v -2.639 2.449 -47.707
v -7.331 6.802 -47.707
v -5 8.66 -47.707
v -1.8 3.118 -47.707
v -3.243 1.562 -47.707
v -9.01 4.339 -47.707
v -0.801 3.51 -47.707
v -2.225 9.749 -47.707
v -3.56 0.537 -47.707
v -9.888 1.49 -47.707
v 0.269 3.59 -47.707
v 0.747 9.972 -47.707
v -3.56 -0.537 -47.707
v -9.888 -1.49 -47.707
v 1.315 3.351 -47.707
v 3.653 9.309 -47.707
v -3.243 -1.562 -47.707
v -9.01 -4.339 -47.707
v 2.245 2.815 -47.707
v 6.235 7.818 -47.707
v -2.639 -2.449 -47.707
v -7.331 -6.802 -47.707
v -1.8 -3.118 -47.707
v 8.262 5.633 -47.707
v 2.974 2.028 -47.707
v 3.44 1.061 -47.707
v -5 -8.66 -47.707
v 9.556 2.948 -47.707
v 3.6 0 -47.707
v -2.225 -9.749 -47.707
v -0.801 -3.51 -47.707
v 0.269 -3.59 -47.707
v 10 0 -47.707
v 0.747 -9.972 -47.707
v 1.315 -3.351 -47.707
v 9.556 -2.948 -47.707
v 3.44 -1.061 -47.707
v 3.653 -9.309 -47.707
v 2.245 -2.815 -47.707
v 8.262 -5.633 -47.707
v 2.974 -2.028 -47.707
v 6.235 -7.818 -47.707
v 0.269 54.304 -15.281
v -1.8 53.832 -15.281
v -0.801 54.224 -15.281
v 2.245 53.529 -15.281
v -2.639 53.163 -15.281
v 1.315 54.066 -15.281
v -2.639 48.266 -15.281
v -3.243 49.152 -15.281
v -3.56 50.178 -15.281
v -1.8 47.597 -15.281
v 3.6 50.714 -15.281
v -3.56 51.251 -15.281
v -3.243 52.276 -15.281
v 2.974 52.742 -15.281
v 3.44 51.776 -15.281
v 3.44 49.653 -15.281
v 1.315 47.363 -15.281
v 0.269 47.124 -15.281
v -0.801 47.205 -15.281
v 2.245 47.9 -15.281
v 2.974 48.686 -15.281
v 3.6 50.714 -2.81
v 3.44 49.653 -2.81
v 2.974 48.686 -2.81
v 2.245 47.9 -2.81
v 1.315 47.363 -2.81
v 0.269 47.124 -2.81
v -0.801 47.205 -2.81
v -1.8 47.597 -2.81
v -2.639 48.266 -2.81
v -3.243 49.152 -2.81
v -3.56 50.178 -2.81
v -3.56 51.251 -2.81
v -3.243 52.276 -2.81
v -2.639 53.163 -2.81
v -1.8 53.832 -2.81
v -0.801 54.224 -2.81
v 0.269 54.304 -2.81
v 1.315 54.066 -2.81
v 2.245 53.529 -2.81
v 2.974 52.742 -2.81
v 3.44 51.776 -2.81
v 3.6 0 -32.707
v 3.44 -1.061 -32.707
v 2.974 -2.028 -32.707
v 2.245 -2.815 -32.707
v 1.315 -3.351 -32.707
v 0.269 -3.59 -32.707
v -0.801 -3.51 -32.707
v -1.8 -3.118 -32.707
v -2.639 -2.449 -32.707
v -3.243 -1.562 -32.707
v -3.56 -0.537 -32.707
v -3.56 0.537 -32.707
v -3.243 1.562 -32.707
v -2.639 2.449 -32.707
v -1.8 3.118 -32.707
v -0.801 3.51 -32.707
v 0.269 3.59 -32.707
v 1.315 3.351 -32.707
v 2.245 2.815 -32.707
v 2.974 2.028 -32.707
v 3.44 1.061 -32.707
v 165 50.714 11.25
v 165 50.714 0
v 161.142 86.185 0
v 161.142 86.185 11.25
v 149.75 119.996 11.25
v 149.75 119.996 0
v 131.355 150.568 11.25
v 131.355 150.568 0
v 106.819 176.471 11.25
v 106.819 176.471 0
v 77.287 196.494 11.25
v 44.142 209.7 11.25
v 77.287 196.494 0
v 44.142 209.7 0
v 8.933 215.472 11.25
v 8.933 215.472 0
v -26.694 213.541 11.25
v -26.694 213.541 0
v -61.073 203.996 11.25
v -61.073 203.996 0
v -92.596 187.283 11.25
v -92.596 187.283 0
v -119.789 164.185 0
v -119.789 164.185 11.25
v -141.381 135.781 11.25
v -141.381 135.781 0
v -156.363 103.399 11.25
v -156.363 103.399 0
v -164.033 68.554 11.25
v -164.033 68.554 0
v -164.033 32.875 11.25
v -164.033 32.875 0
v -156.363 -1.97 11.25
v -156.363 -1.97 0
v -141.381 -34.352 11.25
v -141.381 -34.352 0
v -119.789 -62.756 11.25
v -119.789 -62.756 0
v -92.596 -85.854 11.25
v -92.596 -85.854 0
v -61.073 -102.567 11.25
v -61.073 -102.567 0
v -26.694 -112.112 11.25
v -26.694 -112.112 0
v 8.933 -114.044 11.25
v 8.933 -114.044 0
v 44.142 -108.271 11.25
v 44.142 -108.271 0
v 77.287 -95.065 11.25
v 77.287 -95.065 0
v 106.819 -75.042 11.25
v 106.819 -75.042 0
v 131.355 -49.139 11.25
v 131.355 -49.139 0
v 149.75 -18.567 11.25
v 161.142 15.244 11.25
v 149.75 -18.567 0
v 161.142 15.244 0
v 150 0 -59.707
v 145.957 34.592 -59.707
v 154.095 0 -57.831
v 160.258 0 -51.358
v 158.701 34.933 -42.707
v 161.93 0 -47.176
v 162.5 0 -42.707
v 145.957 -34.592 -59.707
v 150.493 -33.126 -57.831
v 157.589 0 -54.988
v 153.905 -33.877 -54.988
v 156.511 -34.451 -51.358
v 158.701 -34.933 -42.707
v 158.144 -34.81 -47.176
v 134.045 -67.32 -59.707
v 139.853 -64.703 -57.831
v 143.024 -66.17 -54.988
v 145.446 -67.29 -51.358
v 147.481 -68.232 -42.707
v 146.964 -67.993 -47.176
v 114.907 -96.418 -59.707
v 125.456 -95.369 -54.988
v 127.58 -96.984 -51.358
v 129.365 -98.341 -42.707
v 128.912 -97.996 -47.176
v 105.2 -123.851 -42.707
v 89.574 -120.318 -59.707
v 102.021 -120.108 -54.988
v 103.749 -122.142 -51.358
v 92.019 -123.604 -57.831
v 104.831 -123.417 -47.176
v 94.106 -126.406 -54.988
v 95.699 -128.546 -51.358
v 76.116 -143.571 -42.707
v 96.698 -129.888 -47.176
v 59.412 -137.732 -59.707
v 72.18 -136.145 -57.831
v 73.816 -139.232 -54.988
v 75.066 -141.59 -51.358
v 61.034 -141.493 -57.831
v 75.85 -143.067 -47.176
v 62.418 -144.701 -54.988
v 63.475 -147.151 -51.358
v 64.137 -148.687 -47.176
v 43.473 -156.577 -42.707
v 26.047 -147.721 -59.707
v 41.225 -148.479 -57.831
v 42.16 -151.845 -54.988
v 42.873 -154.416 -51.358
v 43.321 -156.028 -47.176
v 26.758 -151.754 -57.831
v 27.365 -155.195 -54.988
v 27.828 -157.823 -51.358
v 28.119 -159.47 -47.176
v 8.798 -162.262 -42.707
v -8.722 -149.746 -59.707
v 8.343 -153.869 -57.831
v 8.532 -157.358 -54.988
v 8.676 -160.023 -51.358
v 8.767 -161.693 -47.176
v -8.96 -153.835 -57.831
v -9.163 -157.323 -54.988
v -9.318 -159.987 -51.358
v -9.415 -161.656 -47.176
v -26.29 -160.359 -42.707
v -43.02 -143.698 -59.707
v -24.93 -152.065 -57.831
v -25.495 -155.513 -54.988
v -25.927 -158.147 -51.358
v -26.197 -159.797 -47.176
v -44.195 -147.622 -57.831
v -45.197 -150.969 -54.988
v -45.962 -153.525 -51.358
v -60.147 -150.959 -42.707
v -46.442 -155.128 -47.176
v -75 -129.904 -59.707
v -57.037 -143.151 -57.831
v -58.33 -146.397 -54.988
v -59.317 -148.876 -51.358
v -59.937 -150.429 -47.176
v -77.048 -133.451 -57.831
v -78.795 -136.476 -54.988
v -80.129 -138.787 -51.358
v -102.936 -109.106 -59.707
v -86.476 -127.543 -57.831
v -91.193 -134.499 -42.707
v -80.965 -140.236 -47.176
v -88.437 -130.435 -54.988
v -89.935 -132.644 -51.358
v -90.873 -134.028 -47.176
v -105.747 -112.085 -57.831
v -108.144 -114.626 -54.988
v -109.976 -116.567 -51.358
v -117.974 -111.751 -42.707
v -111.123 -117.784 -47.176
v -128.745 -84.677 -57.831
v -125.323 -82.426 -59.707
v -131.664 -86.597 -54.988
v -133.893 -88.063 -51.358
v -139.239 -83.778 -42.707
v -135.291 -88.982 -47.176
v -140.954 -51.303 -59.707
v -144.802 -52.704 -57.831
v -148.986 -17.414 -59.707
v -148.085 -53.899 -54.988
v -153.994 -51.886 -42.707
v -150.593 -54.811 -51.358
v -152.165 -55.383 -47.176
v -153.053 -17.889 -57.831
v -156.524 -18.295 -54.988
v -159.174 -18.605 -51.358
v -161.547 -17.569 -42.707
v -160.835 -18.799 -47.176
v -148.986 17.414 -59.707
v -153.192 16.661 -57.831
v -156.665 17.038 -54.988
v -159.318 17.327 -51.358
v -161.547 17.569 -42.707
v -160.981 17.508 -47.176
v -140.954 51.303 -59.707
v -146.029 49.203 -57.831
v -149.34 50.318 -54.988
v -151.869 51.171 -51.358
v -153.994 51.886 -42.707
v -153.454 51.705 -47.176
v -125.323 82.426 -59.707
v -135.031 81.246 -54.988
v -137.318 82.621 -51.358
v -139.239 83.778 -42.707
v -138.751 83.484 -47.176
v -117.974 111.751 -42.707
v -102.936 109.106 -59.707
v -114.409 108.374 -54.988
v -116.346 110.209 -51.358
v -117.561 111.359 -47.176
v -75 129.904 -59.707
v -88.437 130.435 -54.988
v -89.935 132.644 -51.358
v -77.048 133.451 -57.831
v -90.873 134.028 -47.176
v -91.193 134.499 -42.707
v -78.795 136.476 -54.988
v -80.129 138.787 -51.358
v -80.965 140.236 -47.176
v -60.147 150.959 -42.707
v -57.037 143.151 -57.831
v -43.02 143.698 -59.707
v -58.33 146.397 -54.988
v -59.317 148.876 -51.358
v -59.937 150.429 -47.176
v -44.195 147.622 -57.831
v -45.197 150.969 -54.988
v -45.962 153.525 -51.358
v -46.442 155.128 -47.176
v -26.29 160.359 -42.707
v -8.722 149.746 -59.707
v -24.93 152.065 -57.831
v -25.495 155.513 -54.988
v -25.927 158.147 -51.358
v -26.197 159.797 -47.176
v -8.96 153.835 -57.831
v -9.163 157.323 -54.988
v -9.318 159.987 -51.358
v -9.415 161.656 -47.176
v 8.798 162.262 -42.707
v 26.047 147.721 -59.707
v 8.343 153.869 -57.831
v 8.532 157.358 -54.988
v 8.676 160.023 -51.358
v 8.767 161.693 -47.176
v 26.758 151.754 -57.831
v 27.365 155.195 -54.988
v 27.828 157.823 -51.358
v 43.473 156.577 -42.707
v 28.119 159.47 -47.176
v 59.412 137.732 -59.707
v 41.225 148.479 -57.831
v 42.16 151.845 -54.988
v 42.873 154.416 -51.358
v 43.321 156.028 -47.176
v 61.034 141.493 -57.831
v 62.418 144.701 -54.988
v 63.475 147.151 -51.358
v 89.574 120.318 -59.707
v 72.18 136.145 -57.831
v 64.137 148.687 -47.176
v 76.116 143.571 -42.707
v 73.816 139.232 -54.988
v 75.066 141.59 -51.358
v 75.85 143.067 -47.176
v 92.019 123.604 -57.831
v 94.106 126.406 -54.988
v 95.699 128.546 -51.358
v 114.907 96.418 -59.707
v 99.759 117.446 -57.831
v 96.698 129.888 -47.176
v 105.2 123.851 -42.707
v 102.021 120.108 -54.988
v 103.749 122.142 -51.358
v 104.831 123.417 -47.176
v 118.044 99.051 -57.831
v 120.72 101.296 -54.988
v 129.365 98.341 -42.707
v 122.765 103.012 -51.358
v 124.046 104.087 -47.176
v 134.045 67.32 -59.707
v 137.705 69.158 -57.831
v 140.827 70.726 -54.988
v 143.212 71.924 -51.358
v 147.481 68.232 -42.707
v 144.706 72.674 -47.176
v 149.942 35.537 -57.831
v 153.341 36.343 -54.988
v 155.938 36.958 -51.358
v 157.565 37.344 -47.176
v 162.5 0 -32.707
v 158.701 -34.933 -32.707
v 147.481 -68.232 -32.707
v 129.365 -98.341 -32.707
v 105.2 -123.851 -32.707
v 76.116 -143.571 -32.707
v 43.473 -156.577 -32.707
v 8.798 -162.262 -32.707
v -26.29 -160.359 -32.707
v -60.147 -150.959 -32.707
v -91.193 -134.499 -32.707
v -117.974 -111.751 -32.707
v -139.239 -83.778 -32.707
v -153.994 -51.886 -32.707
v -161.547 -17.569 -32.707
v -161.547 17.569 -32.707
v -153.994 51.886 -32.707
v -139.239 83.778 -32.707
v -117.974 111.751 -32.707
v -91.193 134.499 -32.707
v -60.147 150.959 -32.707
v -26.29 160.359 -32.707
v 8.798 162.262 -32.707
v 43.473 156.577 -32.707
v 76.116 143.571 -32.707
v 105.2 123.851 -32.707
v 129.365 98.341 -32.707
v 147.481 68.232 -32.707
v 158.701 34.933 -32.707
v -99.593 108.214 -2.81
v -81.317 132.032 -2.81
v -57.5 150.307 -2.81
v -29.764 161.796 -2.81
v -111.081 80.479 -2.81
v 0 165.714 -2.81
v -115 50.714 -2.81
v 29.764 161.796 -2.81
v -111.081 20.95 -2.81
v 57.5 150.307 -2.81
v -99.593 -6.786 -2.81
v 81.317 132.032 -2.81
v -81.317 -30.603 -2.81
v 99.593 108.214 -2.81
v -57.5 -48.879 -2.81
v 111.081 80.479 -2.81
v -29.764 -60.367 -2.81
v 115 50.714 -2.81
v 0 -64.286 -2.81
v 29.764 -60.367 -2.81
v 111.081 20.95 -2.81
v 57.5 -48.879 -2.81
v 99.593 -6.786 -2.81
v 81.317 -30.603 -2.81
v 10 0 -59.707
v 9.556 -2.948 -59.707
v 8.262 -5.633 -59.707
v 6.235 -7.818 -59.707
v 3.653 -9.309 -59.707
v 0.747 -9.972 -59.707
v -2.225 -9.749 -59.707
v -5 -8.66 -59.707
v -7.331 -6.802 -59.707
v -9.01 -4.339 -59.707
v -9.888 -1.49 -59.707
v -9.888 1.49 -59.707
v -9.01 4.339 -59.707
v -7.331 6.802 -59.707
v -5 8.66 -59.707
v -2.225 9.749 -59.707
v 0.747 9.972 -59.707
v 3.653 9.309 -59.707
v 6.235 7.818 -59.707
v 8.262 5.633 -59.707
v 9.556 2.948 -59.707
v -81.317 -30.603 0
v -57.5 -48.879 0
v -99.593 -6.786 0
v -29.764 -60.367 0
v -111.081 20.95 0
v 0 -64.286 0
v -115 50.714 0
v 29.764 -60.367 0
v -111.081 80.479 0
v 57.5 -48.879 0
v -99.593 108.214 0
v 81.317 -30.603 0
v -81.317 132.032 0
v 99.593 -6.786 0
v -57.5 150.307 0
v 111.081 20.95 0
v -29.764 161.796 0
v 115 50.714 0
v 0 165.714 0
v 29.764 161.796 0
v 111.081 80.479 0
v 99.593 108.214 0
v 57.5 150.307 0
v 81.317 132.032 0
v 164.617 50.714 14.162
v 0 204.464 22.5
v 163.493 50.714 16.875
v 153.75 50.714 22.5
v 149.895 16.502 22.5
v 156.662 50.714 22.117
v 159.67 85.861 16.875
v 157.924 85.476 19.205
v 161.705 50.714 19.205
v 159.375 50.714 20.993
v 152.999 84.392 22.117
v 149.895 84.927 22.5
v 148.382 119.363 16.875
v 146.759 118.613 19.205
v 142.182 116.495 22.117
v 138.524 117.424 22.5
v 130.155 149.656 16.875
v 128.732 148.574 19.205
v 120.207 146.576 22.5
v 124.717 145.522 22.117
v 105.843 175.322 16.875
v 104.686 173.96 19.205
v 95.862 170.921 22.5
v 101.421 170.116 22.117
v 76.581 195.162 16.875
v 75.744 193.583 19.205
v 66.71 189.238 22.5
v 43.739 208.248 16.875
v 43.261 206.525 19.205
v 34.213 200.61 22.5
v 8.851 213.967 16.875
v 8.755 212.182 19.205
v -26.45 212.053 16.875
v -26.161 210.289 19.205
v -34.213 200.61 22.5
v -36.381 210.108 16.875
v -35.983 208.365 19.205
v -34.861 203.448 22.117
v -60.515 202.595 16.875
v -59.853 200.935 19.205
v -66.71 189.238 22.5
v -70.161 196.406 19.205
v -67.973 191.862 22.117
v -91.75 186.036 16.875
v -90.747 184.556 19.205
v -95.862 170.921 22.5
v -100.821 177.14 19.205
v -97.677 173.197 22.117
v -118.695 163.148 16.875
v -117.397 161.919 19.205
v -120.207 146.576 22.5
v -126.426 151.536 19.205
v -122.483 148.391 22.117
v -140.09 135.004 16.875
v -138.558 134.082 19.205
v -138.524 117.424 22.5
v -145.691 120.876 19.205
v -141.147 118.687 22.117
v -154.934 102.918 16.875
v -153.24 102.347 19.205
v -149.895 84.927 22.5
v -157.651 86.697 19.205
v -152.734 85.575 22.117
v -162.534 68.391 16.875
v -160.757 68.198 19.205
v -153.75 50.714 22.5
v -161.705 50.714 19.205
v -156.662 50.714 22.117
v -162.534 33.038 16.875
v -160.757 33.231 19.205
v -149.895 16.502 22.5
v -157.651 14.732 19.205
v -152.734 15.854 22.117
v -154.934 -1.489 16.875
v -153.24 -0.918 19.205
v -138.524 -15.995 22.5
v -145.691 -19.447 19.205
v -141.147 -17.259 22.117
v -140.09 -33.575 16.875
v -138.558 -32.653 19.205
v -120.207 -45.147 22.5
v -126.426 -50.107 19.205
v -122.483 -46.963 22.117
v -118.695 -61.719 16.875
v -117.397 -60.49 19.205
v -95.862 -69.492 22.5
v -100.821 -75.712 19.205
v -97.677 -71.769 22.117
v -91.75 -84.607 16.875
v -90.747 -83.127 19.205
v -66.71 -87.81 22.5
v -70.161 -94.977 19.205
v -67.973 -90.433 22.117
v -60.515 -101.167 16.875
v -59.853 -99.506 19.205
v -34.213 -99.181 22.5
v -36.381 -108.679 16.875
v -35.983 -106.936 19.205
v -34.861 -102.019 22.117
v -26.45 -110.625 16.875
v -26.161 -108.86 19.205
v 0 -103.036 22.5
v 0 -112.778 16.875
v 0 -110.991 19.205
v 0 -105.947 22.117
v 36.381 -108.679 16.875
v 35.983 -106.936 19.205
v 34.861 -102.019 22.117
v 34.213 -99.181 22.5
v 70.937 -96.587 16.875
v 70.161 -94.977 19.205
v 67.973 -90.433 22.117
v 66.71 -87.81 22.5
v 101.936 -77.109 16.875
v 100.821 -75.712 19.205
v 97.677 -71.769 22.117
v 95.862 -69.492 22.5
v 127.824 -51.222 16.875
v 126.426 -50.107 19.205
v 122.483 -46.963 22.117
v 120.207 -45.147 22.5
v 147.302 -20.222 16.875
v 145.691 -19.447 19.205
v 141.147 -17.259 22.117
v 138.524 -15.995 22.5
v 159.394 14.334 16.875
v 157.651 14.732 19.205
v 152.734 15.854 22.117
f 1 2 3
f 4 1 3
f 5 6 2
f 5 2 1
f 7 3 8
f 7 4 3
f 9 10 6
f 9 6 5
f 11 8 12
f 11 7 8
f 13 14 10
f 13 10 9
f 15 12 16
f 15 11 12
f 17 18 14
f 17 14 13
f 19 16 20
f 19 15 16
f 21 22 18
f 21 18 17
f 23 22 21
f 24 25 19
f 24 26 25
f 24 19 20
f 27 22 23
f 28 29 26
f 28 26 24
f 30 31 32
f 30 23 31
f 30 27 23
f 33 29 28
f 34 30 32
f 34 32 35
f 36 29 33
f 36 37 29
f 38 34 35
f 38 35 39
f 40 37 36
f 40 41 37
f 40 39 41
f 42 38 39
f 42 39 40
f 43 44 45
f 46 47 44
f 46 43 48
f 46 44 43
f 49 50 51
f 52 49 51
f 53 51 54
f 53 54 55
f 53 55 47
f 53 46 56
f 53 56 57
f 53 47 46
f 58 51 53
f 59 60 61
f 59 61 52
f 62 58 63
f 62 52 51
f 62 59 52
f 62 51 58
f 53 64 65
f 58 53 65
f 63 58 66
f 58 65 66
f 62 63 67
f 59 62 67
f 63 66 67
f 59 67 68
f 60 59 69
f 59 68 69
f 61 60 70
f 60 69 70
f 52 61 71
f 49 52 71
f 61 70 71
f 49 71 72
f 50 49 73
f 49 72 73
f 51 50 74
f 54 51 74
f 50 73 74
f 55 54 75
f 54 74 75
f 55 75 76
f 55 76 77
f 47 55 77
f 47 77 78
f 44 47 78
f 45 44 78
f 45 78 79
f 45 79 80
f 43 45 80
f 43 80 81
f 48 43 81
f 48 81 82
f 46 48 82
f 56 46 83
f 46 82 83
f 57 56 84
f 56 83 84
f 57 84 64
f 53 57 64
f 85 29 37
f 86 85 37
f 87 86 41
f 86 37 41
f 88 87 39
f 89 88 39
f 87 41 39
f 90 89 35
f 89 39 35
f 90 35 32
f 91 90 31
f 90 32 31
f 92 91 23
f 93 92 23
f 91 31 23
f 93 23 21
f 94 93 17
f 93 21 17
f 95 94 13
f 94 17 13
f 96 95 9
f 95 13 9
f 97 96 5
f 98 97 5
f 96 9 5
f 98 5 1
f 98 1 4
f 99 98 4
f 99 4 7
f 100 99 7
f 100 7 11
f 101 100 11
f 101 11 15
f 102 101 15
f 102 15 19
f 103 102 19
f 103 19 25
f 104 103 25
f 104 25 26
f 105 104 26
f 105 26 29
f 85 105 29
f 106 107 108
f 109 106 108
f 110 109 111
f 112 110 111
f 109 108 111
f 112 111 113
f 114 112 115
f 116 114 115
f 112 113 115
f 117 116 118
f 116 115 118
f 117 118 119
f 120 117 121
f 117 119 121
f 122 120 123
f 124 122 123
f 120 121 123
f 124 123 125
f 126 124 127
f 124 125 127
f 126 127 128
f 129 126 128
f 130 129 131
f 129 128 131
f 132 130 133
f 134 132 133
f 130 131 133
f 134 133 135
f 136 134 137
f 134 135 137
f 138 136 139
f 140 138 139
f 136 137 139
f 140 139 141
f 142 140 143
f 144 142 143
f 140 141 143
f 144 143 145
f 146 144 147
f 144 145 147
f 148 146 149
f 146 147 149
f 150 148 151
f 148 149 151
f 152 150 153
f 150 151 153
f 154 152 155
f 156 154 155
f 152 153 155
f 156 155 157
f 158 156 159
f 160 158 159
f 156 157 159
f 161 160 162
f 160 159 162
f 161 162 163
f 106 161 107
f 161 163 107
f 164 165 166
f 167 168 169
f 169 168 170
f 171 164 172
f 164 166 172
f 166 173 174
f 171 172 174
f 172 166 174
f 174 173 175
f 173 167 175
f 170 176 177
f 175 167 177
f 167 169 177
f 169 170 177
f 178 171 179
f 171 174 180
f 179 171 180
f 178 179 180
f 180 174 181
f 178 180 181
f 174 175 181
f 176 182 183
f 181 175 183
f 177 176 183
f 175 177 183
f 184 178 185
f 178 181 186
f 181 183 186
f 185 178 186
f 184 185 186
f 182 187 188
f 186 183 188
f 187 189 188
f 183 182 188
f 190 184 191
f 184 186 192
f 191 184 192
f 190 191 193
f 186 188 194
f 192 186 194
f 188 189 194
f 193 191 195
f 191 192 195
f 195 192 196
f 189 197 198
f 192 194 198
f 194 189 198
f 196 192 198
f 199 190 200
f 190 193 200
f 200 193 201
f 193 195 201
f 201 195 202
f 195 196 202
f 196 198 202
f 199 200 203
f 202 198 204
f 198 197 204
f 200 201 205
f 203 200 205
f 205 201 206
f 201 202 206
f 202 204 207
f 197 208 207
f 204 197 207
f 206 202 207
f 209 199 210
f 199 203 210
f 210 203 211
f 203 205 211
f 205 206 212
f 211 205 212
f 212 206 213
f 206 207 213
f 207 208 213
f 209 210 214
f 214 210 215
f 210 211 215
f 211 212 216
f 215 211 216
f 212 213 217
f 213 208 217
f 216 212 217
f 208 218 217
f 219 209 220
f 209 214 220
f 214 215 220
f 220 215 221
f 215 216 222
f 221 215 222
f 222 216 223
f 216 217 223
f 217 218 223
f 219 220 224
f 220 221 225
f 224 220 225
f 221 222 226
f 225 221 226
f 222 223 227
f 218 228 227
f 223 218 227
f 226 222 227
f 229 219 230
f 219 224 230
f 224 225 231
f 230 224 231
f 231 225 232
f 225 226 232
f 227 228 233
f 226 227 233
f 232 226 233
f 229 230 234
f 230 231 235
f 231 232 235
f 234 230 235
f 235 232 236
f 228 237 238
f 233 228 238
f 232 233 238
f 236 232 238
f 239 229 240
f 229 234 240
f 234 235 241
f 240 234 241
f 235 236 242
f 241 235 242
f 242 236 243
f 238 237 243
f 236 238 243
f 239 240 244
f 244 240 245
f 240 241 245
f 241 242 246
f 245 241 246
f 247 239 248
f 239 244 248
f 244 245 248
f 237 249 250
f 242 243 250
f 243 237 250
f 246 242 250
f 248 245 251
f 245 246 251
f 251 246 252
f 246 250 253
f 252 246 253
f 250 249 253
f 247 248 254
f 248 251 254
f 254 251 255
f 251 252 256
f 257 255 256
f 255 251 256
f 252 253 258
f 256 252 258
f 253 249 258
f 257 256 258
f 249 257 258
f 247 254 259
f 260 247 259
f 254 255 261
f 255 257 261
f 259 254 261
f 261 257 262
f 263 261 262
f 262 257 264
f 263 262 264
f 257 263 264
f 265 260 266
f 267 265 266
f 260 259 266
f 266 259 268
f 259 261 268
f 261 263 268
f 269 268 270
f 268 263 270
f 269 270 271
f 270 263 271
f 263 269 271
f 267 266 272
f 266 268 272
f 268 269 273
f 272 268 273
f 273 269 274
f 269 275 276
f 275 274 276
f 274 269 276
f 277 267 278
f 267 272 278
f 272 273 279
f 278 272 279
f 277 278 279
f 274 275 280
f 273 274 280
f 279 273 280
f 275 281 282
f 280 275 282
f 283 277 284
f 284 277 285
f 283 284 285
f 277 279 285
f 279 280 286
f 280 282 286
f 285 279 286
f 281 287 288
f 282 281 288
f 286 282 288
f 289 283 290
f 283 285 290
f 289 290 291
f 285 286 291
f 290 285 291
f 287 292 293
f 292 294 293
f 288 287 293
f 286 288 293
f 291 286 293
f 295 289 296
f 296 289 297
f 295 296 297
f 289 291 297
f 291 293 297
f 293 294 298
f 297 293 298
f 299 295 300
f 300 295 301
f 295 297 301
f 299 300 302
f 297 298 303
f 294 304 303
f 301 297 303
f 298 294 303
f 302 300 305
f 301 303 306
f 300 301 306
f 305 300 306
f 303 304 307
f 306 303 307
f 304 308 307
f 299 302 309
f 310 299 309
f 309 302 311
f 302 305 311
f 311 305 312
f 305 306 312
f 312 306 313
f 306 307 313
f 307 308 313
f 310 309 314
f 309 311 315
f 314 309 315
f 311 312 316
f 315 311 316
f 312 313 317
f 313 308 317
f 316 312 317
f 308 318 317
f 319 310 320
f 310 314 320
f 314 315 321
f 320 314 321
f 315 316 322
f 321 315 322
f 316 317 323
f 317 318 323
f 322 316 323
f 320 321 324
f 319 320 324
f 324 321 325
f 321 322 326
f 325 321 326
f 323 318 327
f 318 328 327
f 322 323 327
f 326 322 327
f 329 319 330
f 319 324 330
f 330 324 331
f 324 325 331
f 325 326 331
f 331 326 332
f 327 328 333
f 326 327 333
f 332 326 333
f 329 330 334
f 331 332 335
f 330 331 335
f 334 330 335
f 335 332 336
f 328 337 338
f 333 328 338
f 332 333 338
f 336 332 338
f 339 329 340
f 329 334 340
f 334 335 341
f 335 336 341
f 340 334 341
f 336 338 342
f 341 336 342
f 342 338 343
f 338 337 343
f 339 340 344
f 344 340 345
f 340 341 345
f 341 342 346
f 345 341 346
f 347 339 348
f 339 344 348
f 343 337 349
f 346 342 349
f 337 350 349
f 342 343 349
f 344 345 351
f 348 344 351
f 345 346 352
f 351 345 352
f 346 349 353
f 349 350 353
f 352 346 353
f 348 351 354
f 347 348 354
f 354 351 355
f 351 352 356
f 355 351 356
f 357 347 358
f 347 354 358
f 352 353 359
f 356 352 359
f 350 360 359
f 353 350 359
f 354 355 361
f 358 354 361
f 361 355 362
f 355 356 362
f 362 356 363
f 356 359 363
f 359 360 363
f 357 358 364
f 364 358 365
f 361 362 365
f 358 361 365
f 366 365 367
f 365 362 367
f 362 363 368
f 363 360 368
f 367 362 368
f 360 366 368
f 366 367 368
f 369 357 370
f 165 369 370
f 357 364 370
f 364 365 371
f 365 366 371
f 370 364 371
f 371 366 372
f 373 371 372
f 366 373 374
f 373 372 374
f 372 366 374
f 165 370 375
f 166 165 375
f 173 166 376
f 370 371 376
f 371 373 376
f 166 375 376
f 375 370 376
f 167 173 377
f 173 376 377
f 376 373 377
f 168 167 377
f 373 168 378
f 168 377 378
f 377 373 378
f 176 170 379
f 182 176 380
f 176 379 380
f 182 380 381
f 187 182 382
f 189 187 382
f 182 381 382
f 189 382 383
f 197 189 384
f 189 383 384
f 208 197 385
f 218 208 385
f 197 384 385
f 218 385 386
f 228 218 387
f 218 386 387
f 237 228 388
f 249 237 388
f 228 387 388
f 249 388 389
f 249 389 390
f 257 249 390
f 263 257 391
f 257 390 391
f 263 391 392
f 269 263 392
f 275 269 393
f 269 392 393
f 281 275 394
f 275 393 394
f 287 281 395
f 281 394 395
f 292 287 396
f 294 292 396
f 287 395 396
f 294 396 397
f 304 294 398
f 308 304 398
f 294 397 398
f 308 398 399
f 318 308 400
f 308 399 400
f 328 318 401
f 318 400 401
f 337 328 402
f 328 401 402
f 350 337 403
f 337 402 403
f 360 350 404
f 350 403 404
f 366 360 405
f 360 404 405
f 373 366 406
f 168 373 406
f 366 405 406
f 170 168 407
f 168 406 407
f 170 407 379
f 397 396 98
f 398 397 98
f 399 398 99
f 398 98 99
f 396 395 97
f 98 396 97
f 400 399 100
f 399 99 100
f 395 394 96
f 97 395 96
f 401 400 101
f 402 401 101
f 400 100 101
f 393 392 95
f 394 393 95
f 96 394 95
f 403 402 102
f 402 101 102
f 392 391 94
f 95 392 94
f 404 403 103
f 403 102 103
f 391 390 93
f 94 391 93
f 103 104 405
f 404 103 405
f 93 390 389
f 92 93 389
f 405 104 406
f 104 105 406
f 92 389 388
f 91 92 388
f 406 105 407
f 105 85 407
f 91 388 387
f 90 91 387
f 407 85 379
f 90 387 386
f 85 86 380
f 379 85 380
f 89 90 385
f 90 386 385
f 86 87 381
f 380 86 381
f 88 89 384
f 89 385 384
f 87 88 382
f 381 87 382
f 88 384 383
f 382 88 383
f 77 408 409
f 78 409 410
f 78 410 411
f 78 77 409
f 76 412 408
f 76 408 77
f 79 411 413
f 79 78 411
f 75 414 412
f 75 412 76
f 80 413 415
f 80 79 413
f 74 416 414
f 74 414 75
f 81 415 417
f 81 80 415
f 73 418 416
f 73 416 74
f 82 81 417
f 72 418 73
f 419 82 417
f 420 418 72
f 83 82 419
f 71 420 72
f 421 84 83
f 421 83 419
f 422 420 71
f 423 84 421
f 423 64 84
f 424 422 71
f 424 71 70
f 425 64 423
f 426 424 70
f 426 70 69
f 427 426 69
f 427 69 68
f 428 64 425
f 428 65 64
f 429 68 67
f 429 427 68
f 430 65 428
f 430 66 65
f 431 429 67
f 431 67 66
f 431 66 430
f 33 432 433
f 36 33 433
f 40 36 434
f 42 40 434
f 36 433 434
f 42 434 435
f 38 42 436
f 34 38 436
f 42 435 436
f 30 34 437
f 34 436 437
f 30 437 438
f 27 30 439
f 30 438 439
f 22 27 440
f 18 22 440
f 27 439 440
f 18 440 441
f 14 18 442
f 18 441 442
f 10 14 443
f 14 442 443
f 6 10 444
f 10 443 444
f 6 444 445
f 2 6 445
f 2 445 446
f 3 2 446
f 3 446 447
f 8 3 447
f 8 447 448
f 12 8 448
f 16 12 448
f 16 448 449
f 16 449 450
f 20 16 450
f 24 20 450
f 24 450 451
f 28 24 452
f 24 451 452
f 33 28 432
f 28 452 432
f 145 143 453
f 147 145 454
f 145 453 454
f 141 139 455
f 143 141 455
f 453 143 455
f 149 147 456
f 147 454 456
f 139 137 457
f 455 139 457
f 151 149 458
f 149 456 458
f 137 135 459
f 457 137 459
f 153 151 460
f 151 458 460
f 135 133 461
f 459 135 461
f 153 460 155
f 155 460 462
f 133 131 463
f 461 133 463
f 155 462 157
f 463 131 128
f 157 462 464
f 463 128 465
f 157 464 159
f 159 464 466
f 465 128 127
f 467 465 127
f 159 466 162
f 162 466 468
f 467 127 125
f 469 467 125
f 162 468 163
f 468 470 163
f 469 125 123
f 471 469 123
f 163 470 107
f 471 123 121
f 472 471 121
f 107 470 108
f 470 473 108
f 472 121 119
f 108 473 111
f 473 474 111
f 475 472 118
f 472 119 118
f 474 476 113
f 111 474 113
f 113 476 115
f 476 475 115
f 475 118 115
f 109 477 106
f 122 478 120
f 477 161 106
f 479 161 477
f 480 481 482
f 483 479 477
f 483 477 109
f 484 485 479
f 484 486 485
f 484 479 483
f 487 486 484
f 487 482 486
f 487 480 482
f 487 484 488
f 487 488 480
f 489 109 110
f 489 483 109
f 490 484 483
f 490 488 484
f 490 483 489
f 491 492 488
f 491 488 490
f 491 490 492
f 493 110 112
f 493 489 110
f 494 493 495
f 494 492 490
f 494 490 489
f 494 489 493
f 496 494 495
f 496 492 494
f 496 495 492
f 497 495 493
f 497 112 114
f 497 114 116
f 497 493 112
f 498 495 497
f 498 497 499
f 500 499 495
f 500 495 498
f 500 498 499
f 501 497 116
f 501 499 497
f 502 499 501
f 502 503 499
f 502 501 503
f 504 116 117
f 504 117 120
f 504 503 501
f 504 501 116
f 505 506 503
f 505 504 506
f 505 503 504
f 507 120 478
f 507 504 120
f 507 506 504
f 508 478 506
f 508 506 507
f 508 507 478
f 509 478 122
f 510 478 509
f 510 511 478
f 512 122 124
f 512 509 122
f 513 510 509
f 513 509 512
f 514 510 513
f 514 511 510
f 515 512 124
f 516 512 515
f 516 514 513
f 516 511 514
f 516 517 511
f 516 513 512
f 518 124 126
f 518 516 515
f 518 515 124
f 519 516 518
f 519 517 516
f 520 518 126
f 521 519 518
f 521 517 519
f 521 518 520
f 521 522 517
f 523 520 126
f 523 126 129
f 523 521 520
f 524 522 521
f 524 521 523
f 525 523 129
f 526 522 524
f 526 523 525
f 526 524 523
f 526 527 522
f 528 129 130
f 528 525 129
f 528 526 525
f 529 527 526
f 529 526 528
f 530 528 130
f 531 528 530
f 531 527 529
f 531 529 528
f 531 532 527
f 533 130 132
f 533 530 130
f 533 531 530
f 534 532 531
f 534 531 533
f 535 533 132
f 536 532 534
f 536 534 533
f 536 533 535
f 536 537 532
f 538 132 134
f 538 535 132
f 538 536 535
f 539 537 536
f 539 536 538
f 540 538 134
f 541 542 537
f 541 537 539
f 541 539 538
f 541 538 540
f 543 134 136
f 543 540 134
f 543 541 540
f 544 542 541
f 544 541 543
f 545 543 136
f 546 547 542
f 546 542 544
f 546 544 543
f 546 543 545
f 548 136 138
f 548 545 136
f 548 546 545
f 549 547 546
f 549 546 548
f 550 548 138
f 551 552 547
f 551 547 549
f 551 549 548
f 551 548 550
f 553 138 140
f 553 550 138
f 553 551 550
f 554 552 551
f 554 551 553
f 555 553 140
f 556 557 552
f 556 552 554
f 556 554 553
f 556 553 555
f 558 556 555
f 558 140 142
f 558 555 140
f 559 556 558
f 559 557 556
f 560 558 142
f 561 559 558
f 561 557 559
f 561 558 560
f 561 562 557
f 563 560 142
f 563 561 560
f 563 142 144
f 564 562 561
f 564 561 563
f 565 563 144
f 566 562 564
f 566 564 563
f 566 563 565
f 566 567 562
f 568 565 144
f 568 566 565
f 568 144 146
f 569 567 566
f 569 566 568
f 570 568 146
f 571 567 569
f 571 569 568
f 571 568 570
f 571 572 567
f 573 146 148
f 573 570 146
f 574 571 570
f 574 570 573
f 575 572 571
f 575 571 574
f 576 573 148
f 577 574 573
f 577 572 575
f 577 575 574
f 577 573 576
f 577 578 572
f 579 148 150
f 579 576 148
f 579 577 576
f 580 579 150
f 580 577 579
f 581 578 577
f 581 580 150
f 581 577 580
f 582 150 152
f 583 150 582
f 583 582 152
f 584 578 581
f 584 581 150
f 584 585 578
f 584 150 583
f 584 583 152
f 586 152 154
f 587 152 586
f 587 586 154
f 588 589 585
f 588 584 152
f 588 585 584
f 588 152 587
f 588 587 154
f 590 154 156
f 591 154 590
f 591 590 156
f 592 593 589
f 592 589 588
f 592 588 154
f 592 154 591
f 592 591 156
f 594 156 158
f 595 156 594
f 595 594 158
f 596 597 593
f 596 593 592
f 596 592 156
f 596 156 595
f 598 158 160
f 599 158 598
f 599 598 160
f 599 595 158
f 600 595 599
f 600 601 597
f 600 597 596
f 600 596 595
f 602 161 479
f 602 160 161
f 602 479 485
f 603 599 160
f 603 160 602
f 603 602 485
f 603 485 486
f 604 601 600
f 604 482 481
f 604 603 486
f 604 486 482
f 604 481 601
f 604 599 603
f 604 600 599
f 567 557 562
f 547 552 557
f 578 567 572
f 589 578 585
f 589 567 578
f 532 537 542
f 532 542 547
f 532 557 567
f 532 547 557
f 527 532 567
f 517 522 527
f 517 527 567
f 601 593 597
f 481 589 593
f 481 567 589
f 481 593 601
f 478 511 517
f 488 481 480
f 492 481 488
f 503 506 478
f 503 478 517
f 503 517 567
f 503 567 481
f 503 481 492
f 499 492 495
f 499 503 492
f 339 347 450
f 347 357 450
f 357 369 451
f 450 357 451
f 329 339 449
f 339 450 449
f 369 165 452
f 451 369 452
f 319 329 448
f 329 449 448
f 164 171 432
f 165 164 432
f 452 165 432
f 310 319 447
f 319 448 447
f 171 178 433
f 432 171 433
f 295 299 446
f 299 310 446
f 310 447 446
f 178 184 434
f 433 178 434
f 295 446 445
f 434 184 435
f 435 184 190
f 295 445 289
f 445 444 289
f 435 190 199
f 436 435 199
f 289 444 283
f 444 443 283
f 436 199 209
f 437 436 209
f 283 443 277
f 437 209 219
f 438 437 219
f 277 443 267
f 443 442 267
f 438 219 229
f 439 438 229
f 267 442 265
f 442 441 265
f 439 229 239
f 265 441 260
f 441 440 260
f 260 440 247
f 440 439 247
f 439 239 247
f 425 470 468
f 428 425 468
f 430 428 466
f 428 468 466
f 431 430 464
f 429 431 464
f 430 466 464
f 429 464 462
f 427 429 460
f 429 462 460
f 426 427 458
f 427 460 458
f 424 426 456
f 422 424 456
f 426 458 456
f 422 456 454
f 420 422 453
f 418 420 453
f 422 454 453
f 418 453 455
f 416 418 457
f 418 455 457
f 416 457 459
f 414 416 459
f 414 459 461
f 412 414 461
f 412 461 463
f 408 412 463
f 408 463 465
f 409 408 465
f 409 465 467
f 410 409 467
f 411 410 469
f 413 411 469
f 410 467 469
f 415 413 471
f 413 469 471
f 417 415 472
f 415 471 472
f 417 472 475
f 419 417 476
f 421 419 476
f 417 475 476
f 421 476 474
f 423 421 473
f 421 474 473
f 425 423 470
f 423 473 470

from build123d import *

# Parameters (mm, degrees)
F0_R      = 165
F1_DEPTH  = 22.5
F2_R      = 11.25
F3_R      = 115
F4_DEPTH  = 2.81
F7_R      = 10
F8_DEPTH  = 12
F9_R      = 3.6
F10_DEPTH = 25.4
F11_R     = 3.6
F12_DEPTH = 12.4714


with BuildPart() as f1:
    # F0 (on Top) → F1 (new body)
    with BuildSketch(Plane.XY):
        with Locations((0, 50.714411)):
            Circle(F0_R)
    extrude(amount=F1_DEPTH)

    # F2
    f2_edges = [f1.edges().sort_by_distance(p)[0] for p in [
        (-165, 50.714411, 22.5),
    ]]
    fillet(f2_edges, radius=F2_R)

    # F3 (on face) → F4 (join)
    with BuildSketch(Plane(origin=(0, 0, 0), x_dir=(1, 0, 0), z_dir=(0, 0, -1))):
        with Locations((0, -50.714411)):
            Circle(F3_R)
    extrude(amount=F4_DEPTH)

    # F11 (on face) → F12 (join)
    with BuildSketch(Plane(origin=(0, 0, -2.81), x_dir=(1, 0, 0), z_dir=(0, 0, -1))):
        with Locations((0, -50.714411)):
            Circle(F11_R)
    extrude(amount=F12_DEPTH)


with BuildPart() as f6:
    # F5 (on Front) → F6 (revolve)
    with BuildSketch(Plane.XZ):
        with BuildLine():
            Line((162.5, -32.707262), (0, -32.707262))
            Line((0, -32.707262), (0, -59.707262))
            Line((0, -59.707262), (150, -59.707262))
            ThreePointArc((150, -59.707262), (159.038645, -53.257736), (162.5, -42.707262))
            Line((162.5, -42.707262), (162.5, -32.707262))
        make_face()
    revolve(axis=Axis((0, 0, -46.207262), (0, 0, -1)))

    # F7 (on face) → F8 (cut)
    with BuildSketch(Plane(origin=(0, 0, -59.707262), x_dir=(1, 0, 0), z_dir=(0, 0, -1))):
        Circle(F7_R)
    extrude(amount=-F8_DEPTH, mode=Mode.SUBTRACT)

    # F9 (on face) → F10 (cut)
    with BuildSketch(Plane(origin=(0, 0, -47.707262), x_dir=(1, 0, 0), z_dir=(0, 0, -1))):
        Circle(F9_R)
    extrude(amount=-F10_DEPTH, mode=Mode.SUBTRACT)


solid = Compound([f1.part, f6.part])
